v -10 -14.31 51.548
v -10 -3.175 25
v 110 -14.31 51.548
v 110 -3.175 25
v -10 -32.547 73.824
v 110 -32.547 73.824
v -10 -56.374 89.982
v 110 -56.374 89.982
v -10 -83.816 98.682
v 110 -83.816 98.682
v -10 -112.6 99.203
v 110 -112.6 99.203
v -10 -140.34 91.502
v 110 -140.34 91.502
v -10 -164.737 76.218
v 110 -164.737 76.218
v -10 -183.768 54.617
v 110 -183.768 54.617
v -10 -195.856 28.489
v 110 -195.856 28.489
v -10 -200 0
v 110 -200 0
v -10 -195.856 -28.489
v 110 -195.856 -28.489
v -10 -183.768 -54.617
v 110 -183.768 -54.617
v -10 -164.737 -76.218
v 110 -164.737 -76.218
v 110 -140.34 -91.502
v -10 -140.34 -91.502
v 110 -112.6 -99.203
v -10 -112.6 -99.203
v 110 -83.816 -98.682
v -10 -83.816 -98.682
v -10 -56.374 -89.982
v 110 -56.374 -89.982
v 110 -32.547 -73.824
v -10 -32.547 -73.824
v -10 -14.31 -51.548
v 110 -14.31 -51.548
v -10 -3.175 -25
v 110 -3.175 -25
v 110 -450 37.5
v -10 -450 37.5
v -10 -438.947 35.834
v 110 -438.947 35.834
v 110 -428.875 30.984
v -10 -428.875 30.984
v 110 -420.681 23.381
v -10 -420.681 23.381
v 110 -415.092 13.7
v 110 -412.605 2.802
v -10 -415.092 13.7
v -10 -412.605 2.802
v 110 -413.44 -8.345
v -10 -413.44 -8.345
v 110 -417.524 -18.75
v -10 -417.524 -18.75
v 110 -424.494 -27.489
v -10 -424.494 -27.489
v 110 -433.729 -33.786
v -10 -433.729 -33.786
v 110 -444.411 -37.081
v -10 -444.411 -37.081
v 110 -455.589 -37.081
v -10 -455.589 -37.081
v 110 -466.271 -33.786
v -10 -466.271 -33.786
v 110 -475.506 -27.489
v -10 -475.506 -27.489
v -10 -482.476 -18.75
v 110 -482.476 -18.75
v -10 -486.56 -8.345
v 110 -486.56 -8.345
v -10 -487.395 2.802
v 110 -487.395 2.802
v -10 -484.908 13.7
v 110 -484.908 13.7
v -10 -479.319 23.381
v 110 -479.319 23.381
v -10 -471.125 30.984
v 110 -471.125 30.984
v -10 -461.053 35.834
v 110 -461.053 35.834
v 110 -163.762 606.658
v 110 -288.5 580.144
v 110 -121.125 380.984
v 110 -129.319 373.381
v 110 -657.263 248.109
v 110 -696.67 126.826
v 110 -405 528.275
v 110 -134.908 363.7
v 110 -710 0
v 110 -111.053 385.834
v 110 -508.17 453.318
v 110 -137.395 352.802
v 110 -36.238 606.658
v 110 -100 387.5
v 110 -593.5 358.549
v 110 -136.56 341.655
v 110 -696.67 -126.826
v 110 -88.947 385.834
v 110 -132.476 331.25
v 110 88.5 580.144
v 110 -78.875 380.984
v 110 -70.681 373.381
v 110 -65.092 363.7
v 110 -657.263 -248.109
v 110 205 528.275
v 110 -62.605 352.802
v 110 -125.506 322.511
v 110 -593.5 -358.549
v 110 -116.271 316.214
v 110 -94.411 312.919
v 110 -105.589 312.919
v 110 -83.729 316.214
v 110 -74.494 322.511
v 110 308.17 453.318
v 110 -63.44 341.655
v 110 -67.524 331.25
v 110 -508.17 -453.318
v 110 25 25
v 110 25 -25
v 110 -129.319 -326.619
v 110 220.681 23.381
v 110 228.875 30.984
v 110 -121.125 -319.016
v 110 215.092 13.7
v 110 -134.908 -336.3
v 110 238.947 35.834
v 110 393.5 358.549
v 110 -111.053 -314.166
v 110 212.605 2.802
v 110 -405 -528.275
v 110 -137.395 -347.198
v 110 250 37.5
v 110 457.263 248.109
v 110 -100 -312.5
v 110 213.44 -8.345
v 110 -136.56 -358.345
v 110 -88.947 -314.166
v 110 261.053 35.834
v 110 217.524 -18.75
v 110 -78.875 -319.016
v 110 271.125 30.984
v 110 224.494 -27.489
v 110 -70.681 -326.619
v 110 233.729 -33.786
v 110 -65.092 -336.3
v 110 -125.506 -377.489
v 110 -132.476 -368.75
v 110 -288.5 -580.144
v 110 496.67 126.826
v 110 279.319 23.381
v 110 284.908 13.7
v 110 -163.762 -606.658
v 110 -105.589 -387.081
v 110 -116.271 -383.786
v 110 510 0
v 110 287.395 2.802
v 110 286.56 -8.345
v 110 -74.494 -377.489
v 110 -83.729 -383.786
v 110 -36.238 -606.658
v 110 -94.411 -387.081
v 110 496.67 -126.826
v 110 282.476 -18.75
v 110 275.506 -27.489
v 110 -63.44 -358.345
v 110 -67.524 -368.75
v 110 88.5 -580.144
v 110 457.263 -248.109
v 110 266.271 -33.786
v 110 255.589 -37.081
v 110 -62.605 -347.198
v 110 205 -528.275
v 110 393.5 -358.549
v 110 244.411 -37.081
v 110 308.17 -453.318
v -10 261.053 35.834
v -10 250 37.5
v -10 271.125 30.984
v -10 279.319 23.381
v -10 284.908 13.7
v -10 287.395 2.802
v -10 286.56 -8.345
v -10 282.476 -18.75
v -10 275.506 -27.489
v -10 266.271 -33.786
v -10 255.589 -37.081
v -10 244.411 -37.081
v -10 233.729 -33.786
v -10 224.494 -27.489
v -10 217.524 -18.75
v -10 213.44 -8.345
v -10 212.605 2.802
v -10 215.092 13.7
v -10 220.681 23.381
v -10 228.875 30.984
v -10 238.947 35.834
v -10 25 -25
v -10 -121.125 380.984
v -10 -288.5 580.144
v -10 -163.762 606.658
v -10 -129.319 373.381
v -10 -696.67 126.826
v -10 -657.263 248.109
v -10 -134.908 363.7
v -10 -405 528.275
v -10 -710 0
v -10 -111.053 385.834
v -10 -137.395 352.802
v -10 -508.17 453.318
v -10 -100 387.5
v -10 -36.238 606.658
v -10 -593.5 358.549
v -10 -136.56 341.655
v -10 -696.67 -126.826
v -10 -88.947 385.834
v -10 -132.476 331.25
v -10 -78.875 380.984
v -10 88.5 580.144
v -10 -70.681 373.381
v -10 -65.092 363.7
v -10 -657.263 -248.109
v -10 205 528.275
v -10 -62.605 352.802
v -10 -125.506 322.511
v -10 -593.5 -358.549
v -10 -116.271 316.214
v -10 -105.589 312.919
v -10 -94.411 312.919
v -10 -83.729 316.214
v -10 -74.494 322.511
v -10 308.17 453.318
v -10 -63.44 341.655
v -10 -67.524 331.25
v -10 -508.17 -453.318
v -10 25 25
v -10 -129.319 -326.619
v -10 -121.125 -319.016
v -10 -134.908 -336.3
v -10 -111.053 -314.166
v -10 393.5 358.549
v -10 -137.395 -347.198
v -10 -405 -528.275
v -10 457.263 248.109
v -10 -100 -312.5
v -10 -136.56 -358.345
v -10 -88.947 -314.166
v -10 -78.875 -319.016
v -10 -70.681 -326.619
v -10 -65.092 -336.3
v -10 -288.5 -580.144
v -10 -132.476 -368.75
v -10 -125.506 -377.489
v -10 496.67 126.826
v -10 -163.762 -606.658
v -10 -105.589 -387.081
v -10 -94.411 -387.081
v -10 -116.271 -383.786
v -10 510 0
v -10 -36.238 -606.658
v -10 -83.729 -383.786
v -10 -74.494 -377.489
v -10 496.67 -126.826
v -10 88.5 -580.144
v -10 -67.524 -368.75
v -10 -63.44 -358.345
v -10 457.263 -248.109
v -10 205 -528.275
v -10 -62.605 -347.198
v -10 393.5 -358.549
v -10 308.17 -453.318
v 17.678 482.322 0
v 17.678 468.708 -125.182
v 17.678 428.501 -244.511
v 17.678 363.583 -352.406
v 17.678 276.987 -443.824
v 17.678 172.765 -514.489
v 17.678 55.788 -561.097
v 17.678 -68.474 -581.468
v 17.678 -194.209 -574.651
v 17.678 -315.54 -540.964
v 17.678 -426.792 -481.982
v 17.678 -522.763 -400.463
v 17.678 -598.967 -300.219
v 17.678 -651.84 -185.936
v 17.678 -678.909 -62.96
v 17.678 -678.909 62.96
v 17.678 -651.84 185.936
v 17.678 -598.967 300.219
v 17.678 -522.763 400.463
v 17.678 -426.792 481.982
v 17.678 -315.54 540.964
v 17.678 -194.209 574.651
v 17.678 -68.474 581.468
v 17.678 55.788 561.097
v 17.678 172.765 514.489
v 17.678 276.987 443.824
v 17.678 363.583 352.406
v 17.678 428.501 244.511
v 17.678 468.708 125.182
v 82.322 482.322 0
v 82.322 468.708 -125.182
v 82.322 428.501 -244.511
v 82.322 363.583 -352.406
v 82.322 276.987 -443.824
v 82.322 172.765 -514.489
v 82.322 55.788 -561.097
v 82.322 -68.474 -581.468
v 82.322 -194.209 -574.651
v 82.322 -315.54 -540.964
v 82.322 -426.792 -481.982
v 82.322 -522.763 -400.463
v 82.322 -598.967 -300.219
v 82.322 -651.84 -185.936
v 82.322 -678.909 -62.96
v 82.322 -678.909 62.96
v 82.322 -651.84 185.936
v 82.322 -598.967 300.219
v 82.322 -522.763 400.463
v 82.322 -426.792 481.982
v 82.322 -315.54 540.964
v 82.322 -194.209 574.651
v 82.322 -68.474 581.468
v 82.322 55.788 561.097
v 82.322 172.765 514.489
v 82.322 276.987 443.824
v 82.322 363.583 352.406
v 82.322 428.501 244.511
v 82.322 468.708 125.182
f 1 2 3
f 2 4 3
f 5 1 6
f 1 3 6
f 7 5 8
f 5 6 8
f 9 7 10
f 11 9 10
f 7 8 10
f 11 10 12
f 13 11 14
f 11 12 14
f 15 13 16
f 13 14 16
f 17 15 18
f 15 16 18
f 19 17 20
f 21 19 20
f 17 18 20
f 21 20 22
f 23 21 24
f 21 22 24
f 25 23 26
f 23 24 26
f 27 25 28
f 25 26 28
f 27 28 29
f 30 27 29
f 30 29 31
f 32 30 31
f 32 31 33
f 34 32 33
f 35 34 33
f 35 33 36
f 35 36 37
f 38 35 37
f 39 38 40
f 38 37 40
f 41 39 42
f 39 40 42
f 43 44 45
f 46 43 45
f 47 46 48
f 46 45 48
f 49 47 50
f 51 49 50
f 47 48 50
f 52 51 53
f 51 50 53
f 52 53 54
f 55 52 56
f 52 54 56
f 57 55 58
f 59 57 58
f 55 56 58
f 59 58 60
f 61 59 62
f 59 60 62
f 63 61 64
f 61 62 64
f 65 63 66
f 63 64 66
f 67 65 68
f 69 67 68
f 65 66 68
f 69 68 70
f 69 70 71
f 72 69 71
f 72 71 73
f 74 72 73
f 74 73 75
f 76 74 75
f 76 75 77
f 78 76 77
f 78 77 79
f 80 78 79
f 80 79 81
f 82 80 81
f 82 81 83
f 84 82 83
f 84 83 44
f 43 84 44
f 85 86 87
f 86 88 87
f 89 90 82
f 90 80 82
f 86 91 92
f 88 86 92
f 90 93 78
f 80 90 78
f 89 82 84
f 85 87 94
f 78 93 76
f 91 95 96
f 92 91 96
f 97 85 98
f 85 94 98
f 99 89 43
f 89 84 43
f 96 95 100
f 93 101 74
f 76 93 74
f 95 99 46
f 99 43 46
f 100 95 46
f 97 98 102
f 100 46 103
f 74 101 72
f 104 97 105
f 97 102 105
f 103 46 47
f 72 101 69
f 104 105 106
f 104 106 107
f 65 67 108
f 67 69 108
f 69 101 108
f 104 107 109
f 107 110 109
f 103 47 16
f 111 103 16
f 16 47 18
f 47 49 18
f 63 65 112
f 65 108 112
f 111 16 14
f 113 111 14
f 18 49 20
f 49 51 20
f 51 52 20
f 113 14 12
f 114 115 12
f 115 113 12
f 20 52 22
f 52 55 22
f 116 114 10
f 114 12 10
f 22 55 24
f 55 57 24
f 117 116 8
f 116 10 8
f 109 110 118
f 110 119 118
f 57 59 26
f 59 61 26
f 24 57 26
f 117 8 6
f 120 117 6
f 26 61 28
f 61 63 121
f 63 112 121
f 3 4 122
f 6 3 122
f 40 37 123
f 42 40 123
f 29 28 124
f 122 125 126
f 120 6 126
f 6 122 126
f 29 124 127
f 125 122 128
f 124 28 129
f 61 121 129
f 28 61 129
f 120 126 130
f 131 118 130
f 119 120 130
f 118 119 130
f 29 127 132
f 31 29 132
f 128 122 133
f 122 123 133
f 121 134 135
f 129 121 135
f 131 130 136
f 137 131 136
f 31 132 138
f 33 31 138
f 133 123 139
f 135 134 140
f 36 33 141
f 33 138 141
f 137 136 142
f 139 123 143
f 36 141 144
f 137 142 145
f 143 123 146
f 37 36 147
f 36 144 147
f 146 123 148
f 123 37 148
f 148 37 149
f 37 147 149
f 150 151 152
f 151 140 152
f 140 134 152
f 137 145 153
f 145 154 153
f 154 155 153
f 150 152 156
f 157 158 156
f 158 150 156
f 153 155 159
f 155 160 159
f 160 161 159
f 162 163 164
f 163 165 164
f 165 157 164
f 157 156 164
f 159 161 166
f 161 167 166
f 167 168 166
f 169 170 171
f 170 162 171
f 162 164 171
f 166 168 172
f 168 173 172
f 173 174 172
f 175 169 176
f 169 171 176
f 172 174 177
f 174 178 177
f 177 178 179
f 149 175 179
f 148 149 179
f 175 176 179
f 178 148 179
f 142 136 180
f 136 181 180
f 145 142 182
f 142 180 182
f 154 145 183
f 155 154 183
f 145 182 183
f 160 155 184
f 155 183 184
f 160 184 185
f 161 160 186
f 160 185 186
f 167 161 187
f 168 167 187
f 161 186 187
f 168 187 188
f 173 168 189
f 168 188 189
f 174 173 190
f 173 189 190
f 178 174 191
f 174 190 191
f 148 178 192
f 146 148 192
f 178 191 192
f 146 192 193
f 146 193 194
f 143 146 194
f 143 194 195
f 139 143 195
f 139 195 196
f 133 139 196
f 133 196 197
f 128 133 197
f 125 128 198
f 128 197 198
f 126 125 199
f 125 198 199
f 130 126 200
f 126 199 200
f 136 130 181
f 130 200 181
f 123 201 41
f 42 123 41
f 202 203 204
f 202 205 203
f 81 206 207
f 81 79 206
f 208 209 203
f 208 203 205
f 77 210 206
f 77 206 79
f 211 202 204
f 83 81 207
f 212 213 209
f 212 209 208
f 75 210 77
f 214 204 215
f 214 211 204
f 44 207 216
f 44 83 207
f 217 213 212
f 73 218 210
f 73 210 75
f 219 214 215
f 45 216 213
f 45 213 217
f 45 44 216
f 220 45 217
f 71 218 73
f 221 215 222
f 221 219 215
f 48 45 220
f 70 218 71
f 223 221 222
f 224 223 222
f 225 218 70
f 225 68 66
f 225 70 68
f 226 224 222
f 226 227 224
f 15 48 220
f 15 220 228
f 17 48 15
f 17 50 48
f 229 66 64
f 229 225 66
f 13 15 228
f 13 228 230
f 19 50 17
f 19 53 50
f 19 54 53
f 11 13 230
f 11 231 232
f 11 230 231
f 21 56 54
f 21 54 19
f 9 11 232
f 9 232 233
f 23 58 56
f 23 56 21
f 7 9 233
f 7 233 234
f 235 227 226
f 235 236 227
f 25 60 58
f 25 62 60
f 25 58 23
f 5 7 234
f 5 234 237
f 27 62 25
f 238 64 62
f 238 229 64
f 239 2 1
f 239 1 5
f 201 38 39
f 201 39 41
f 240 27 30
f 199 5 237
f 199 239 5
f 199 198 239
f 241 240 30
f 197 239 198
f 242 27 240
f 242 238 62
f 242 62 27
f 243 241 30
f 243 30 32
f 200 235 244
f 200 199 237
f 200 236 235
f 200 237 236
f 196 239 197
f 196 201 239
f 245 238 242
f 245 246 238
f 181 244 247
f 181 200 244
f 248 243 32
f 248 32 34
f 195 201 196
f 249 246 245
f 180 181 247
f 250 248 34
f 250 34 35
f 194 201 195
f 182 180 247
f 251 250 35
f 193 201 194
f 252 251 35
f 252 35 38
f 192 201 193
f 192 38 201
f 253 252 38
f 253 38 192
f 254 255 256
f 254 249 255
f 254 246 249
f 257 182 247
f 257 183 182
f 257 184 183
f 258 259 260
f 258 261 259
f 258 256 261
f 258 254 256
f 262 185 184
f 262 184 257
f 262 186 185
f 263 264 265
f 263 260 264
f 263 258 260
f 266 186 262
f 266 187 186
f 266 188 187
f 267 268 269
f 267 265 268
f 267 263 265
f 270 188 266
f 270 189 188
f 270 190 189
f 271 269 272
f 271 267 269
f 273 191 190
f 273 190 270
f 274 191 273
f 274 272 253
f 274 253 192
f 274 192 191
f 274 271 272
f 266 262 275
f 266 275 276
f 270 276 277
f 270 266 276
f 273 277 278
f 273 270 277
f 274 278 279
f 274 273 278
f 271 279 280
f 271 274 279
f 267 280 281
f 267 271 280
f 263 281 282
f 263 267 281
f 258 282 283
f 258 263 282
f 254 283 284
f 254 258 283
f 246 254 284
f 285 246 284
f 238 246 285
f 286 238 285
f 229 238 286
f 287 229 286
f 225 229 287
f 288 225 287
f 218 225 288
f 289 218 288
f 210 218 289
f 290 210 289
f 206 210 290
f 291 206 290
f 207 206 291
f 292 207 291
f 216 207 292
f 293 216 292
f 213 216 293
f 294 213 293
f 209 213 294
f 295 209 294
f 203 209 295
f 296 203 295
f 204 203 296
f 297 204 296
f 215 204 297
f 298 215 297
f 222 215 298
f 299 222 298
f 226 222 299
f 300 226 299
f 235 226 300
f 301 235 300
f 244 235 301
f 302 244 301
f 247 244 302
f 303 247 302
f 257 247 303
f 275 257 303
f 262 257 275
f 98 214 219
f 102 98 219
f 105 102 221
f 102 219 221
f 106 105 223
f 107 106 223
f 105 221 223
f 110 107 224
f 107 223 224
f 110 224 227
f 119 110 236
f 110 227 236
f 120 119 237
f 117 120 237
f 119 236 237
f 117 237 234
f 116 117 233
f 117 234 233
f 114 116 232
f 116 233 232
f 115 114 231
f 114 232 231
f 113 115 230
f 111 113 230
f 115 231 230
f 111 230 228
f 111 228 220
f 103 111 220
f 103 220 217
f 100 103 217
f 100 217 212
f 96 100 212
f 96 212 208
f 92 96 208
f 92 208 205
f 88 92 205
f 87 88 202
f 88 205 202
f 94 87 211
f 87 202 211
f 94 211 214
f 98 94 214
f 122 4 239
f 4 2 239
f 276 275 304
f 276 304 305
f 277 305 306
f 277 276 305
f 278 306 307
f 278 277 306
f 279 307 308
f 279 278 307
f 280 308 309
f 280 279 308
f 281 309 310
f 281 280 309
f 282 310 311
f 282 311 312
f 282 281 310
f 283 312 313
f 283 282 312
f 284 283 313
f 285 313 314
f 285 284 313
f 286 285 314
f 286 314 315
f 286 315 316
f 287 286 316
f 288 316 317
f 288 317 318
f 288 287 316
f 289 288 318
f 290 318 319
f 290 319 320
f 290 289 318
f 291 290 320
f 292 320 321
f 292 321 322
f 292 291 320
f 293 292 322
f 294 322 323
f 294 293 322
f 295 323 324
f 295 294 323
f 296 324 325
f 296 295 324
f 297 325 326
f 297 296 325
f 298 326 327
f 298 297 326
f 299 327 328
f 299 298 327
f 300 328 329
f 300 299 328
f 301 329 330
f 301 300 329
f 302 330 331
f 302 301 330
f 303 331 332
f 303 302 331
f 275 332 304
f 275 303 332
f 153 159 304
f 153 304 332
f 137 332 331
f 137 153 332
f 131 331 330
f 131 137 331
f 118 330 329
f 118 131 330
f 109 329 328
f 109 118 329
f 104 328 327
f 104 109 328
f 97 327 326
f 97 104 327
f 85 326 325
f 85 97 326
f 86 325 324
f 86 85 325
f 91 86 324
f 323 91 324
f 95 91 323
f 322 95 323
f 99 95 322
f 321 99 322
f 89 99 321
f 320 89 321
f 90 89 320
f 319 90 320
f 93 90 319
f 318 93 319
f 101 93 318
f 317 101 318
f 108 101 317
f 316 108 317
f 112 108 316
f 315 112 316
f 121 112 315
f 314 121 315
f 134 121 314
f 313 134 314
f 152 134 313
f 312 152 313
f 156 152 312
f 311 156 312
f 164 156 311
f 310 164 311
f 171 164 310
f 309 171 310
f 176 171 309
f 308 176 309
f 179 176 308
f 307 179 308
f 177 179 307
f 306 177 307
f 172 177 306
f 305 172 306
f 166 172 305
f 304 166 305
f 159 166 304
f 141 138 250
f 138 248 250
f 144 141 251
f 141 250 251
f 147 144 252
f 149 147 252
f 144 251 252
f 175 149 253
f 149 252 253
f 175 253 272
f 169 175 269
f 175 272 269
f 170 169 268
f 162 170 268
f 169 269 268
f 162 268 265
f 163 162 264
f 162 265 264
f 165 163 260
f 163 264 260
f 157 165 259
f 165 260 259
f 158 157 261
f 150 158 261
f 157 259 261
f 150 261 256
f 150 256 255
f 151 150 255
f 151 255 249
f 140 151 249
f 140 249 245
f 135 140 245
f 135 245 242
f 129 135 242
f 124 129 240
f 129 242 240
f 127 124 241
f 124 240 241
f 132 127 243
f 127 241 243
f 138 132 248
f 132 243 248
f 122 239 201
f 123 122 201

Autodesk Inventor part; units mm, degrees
ref_plane "YZ Plane" through (0, 0, 0) normal (1, 0, 0) x (0, 1, 0)
ref_plane "XZ Plane" through (0, 0, 0) normal (0, 1, 0) x (-1, 0, 0)
ref_plane "XY Plane" through (0, 0, 0) normal (0, 0, 1) x (1, 0, 0)
sketch "Sketch1" plane through (0, 0, 0) normal (0, 0, 1) x (1, 0, 0)
  line L0 (0, 0) -> (100, 0)
  line L1 (100, 0) -> (100, 500)
  line L2 (0, 500) -> (0, 0)
  line L3 (0, 500) -> (17.6777, 482.3223)
  line L4 (0, 500) -> (25, 500) construction
  line L5 (100, 500) -> (82.3223, 482.3223)
  line L6 (100, 500) -> (125, 500) construction
  line L7 (82.3223, 482.3223) -> (17.6777, 482.3223)
  line L8 (50, -100) -> (-150, -100)
  dimension "d7" = 200
revolve "Revolution1" add sketch "Sketch1" angle 360 about axis through (50, -100, 0) along (-1, 0, 0)
sketch "Sketch2" plane through (0, -100, 0) normal (-1, 0, 0) x (0, 0, 1)
  circle A0 centre (0, 0) radius 600 projected
  circle A1 centre (350, 0) radius 37.5
  circle A2 centre (0, 0) radius 100
  circle A3 centre (0, -350) radius 37.5
  circle A4 centre (-350, 0) radius 37.5
  circle A5 centre (0, 350) radius 37.5
  point P0 (0, 100)
  dimension "d9" = 75
  dimension "d12" = 360
extrude "Extrusion1" cut sketch "Sketch2" against normal blind 200 contours A1 | A3 | A4 | A5
thicken "Thicken1" operation add thickness 10 both sides no extend neighbours yes toward (1, 0, 0) faces at (100, -364.9419, 262.9039)
thicken "Thicken2" operation add thickness 10 both sides no extend neighbours yes toward (-1, 0, 0) faces at (0, -364.9419, 262.9039)
sketch "Sketch3" plane through (-10, -100, 0) normal (-1, 0, 0) x (0, 0, 1)
  line L0 (25, 96.8246) -> (25, 125)
  line L1 (25, 125) -> (-25, 125)
  line L2 (-25, 125) -> (-25, 96.8246)
  line L3 (-25, 75) -> (25, 125) construction
  line L4 (25, 75) -> (-25, 125) construction
  circle A0 centre (0, 0) radius 100 projected
  circle A1 centre (0, 0) radius 100
  point P0 (0, 100)
extrude "Extrusion2" cut sketch "Sketch3" against normal blind 120 contours A0 L2 L1 L0
properties part number "Practica 2 Polea"
